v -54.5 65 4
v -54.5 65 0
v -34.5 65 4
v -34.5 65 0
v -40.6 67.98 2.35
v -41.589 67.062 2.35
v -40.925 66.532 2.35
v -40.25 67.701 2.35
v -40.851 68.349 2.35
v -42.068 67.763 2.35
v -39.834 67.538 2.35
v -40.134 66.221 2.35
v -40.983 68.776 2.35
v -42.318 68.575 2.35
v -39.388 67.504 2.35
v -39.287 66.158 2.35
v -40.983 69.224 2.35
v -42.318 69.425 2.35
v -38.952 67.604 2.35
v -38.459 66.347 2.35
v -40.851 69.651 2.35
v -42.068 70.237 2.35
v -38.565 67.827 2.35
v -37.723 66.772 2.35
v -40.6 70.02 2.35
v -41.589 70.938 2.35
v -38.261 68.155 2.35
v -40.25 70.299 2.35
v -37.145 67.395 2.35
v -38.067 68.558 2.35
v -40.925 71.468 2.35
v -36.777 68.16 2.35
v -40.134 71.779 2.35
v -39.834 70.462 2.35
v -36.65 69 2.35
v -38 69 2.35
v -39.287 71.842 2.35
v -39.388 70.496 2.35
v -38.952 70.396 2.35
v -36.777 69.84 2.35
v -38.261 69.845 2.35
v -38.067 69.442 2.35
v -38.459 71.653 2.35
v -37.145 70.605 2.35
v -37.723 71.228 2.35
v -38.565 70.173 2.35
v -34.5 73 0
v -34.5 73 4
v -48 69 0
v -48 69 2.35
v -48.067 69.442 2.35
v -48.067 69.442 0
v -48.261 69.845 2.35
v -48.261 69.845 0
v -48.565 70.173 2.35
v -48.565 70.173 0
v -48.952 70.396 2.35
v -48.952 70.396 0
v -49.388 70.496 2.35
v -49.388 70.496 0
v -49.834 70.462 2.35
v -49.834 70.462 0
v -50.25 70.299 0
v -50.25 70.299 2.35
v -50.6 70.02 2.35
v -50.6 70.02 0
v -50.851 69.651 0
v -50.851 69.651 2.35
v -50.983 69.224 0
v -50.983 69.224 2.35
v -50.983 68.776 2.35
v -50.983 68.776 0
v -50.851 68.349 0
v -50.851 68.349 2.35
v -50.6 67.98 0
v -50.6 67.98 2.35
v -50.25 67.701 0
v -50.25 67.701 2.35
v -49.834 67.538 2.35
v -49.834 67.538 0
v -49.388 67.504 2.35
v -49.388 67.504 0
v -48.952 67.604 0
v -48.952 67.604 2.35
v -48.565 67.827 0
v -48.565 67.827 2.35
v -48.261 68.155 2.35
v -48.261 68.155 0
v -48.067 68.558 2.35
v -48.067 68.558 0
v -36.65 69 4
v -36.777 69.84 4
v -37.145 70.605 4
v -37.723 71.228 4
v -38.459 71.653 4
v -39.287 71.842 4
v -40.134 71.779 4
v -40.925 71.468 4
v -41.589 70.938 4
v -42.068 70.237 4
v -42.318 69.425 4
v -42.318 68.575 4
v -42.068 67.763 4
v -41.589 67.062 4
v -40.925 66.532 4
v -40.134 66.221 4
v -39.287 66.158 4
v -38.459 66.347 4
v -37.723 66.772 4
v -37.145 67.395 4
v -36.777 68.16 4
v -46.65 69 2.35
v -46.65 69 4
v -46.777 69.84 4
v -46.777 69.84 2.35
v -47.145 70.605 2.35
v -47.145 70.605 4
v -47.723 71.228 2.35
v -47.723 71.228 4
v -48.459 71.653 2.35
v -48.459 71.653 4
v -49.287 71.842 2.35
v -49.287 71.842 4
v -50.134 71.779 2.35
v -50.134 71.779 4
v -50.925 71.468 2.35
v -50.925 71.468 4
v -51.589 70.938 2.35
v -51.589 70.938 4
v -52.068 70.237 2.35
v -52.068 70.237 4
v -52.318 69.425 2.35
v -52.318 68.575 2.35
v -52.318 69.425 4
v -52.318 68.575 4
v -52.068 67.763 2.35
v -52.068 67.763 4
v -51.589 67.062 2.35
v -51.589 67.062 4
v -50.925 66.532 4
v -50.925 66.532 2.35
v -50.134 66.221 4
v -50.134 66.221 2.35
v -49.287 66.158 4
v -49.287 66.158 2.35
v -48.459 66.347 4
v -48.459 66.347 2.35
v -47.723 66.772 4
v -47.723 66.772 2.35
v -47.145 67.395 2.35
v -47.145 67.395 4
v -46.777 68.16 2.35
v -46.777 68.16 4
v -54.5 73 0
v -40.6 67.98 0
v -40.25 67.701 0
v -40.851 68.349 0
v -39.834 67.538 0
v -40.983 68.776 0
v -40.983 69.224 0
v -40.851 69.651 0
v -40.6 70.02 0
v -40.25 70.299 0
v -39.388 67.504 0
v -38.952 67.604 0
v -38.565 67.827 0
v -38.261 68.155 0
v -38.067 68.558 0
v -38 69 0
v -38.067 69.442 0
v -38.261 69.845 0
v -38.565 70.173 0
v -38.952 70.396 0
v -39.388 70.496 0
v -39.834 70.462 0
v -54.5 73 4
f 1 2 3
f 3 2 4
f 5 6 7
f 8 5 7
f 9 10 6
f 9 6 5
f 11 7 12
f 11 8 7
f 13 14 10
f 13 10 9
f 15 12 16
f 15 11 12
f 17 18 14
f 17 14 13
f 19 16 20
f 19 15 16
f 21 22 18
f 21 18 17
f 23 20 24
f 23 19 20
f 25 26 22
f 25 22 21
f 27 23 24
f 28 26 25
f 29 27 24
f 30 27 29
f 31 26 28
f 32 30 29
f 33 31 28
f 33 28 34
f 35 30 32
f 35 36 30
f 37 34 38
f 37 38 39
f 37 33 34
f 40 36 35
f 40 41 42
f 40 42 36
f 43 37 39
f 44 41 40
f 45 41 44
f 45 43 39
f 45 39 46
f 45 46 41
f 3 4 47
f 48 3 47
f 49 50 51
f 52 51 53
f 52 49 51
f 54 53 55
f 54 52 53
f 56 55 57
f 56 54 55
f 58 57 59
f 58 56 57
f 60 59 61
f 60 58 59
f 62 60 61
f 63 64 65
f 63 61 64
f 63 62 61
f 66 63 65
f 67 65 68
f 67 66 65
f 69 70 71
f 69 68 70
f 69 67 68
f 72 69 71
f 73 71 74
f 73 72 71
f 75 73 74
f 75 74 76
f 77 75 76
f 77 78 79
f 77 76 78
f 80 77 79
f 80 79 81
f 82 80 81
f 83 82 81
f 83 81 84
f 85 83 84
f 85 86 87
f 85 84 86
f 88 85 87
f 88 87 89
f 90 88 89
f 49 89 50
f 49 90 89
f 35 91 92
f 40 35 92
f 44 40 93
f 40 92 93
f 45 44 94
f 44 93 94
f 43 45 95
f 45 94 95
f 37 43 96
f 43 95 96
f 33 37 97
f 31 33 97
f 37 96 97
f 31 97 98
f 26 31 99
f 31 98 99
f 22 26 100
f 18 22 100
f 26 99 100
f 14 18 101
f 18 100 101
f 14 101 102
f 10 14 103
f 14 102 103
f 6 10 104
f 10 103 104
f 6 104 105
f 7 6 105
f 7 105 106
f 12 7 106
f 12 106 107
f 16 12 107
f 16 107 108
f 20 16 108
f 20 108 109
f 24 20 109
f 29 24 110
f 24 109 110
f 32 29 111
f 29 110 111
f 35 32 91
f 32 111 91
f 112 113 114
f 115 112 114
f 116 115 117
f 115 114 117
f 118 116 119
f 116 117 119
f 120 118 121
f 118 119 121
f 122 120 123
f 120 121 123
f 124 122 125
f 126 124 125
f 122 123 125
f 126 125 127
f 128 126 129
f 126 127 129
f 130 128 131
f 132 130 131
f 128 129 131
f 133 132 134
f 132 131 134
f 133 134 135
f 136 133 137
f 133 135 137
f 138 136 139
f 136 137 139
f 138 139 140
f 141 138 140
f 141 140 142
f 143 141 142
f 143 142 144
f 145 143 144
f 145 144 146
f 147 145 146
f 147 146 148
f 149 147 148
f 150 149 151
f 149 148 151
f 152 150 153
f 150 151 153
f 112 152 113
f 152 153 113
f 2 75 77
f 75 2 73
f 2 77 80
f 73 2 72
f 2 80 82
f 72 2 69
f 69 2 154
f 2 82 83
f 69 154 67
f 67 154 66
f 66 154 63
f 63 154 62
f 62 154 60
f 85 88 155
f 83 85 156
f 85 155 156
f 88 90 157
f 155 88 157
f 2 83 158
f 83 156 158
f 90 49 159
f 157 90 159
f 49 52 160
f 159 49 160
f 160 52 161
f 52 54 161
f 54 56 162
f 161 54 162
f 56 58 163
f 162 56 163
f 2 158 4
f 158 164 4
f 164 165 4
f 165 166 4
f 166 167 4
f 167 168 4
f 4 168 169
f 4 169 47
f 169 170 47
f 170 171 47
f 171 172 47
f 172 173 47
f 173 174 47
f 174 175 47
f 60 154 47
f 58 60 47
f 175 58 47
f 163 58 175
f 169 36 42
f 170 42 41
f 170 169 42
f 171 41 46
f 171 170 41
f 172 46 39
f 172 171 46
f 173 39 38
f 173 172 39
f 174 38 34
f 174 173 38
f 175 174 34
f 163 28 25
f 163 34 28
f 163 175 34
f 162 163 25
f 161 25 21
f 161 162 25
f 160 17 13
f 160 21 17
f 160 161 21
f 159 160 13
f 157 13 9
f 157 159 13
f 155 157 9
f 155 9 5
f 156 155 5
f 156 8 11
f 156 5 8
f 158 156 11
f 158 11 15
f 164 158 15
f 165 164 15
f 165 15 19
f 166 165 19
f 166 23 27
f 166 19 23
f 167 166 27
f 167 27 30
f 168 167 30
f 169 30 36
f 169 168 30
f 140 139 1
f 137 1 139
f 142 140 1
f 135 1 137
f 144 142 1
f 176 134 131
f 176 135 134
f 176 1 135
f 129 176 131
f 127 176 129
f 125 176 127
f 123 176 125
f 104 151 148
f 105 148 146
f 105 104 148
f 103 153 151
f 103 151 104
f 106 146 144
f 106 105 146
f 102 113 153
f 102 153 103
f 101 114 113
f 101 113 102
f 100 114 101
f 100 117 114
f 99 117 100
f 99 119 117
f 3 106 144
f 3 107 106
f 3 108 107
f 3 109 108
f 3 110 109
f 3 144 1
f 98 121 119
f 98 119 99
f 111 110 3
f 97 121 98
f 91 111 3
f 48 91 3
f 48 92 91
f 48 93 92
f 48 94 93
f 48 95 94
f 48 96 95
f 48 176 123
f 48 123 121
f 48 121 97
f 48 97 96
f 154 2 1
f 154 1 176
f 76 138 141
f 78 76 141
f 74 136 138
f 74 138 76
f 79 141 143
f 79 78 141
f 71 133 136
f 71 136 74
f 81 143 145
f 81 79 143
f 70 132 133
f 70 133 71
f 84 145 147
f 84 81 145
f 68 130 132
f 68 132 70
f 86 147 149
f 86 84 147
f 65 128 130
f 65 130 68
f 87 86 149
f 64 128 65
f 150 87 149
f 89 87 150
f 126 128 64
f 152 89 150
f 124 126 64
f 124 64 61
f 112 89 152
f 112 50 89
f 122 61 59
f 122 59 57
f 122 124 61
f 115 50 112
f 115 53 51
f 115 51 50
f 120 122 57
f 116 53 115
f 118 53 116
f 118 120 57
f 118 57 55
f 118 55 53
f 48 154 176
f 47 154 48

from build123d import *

# Parameters (mm, degrees)
CROQUIS1_W              = 10
CROQUIS1_H              = 8
CROQUIS1_R              = 1.5
SALIENTE_EXTRUIR1_DEPTH = 4
CROQUIS2_R              = 2.85
CORTAR_EXTRUIR1_DEPTH   = 1.65


with BuildPart() as part:
    # Croquis1 → Saliente-Extruir1 (new body)
    # profile 1 of 2: a face of its own
    with BuildSketch(Plane.XY):
        with Locations((-39.5, 69)):
            Rectangle(CROQUIS1_W, CROQUIS1_H)
        with Locations((-39.5, 69)):
            Circle(CROQUIS1_R, mode=Mode.SUBTRACT)
    # profile 2 of 2: a face of its own
    with BuildSketch(Plane.XY):
        with Locations((-49.5, 69)):
            Rectangle(CROQUIS1_W, CROQUIS1_H)
        with Locations((-49.5, 69)):
            Circle(CROQUIS1_R, mode=Mode.SUBTRACT)
    extrude(amount=SALIENTE_EXTRUIR1_DEPTH)

    # Croquis2 → Cortar-Extruir1 (cut)
    with BuildSketch(Plane.XY.offset(4)):
        with Locations((-49.5, 69)):
            Circle(CROQUIS2_R)
        with Locations((-39.5, 69)):
            Circle(CROQUIS2_R)
    extrude(amount=-CORTAR_EXTRUIR1_DEPTH, mode=Mode.SUBTRACT)


solid = part.part
